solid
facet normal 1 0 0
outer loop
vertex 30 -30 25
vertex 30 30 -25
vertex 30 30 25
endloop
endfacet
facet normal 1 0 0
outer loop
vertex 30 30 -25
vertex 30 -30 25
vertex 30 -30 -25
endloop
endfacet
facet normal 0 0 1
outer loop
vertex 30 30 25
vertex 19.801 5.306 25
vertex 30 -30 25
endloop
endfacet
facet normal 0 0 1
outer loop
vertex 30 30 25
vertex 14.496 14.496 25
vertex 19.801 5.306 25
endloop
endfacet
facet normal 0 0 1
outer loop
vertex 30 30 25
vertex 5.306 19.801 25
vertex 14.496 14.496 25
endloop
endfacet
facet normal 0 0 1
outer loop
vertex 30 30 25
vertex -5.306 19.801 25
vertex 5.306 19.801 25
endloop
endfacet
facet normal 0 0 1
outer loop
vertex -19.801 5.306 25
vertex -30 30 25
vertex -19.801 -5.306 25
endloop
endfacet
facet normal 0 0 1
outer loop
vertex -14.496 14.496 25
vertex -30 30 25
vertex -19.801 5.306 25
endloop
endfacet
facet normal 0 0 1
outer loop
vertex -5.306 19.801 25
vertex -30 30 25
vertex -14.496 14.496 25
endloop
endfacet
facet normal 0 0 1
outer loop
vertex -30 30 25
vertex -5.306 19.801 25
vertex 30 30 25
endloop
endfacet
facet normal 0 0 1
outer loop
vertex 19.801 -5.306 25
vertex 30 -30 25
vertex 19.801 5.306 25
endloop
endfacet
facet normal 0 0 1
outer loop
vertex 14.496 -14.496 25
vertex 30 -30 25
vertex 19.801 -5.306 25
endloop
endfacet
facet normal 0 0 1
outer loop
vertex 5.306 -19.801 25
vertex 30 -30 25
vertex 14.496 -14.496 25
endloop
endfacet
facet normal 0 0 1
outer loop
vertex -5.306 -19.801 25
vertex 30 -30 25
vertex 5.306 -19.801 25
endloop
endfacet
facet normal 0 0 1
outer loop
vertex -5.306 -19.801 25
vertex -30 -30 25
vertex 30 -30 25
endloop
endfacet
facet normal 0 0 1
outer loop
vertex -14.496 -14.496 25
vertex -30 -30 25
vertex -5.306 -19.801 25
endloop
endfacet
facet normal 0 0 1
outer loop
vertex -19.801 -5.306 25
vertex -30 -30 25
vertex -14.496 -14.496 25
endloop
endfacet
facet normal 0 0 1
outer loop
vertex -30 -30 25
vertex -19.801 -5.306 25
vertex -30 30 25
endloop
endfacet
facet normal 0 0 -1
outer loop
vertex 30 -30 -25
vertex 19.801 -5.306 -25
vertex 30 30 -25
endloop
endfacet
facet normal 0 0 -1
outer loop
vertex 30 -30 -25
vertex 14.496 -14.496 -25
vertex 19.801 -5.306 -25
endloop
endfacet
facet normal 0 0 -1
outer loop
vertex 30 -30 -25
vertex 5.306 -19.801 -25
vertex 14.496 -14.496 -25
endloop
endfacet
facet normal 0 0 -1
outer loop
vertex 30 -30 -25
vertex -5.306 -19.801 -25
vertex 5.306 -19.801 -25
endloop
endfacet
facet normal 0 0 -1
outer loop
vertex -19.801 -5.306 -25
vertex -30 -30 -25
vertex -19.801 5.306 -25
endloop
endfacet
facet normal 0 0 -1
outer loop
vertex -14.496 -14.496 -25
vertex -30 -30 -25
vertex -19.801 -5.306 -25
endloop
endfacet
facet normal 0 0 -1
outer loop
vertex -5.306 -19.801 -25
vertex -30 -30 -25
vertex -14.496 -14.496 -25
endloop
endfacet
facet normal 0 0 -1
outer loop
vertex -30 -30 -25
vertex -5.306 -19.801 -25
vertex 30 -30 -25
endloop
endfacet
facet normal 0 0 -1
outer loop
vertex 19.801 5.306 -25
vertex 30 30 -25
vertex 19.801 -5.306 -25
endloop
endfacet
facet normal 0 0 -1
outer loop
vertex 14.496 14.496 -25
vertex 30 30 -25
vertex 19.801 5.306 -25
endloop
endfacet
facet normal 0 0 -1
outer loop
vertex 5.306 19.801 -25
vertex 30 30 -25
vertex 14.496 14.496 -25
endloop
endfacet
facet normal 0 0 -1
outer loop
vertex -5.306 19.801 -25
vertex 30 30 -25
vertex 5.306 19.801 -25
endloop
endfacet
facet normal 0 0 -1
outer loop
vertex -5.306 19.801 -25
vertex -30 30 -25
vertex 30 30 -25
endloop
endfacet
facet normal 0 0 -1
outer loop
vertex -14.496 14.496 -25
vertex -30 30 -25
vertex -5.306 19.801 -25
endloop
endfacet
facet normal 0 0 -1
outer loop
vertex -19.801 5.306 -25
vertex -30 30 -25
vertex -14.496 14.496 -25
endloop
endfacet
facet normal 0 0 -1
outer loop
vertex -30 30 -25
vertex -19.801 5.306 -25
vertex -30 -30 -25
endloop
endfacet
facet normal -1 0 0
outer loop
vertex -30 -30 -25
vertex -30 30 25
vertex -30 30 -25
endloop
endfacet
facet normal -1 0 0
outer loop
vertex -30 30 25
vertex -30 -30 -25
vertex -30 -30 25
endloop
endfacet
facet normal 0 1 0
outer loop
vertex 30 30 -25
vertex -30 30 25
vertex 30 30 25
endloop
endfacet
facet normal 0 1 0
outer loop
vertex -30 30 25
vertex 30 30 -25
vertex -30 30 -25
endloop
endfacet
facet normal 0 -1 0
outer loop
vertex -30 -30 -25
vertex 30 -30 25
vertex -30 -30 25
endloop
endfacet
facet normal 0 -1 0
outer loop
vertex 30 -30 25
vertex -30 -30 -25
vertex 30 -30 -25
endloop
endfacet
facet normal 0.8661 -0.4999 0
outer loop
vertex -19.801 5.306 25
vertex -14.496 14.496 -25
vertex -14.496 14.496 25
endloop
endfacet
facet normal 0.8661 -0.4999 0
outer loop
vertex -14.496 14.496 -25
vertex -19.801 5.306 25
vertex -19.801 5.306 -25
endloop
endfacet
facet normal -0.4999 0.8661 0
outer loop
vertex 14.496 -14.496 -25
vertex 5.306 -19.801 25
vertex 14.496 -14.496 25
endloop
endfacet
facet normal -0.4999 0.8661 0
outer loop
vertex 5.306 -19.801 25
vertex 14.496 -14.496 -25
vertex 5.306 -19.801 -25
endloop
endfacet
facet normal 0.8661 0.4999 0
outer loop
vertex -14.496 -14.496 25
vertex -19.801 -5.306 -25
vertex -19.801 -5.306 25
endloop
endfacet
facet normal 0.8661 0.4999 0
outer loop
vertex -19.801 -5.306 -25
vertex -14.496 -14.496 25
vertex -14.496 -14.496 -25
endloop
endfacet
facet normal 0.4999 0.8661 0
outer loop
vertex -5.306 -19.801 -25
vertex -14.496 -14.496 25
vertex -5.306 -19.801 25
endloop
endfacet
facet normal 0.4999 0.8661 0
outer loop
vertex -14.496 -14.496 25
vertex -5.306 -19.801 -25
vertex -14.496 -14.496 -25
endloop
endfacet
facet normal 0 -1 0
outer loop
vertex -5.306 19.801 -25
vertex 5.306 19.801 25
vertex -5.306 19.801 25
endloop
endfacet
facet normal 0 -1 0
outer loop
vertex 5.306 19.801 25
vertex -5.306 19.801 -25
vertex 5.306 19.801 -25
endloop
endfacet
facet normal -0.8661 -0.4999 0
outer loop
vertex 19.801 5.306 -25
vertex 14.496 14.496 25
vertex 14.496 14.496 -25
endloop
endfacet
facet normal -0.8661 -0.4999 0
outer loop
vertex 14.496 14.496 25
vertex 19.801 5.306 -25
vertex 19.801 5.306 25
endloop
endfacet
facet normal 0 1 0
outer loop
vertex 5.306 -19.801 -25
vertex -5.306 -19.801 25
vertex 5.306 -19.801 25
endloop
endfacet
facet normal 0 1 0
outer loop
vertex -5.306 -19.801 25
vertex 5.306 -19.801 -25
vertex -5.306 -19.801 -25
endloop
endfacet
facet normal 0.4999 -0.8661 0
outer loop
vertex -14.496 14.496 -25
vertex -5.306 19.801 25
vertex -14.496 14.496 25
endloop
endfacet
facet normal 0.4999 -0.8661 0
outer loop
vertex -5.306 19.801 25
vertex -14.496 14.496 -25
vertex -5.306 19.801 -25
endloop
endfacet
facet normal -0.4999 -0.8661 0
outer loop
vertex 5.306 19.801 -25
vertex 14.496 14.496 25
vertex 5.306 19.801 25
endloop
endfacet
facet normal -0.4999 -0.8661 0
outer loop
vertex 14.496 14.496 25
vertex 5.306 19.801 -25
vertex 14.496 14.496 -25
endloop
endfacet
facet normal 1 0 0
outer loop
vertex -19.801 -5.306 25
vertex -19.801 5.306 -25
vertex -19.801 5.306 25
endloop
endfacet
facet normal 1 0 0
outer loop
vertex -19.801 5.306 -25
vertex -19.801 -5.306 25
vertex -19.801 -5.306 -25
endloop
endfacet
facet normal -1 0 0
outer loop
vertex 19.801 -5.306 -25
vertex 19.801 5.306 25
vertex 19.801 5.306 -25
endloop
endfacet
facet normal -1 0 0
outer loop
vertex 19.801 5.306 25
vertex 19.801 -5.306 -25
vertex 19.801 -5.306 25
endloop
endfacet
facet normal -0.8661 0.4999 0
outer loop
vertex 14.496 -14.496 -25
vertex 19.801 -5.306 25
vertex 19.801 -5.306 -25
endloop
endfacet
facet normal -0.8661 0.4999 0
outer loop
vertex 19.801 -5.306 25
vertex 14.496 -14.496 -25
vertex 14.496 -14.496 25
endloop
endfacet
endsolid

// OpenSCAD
// file: libpeginhole.scad
/*
 *  Copyright 2024 AGH Center of Excellence in Artificial Intelligence
 *
 *  Licensed under the Apache License, Version 2.0 (the "License");
 *  you may not use this file except in compliance with the License.
 *  You may obtain a copy of the License at
 *
 *      http://www.apache.org/licenses/LICENSE-2.0
 *
 *  Unless required by applicable law or agreed to in writing, software
 *  distributed under the License is distributed on an "AS IS" BASIS,
 *  WITHOUT WARRANTIES OR CONDITIONS OF ANY KIND, either express or implied.
 *  See the License for the specific language governing permissions and
 *  limitations under the License.
 */
EPS = 0.001;

function circle_coordinate(x, r, p) = [ r * cos(x + p), r *sin(x + p) ];
function regular_shape_vertices(n = 3, r = 1, phase = 0) = [for (t = [0:360 / n:360 - EPS]) circle_coordinate(t, r, phase)];

/* Makes a single peg in form of regular prism
-  Args:
- @vertices: int - number of the base polygon vertices
- @diameter: num - the diameter of the circle to construct the vertices
- @height: num - the height of the prism
- @angle_offset: num - rotation of all vertices
- @is_cylinder: bool - flag to convert prism into cylinder
*/
module regular_prism(vertices, diameter, height, angle_offset, is_cylinder = false)
{
	if (is_cylinder) {
		cylinder(h = height, r = diameter / 2, center = true);
	} else if (vertices < 3) {
		echo("ERROR: Can't construct polygon with less than 3 vertices!");
	} else {
		linear_extrude(height = height, center = true) {
			if (vertices == 4) {
				square(diameter / sqrt(2), center = true);
			} else {
				points = regular_shape_vertices(n = vertices, r = diameter / 2, phase = angle_offset);
				polygon(points);
			}
		}
	}
}

/* Makes a single peghole
-  Args:
- @slot_size: num - the side of the box
- @depth: num - the thickness of the surface for insertion
- @height: num - the height of the whole box
- @leg_width: num - the side of the supporting legs
*/
module single_insertion_box(slot_size, depth, height, leg_width) {
	difference() {
		// Insertion surface
		cube([ slot_size, slot_size, height ], center = true);

		// Clearance (4 legs)
		translate([ 0, 0, -depth ]) cube([ slot_size + EPS, slot_size - 2 * leg_width, height ], center = true);
		translate([ 0, 0, -depth ]) cube([ slot_size - 2 * leg_width, slot_size + EPS, height ], center = true);

		// Peghole
		children(0);
	}
}

/* Makes multiple pegholes
-  Args:
- @slot_size: num - the side of the box
- @array_size: vec[int, int] - array dimensions of the holes grid
- @depth: num - the thickness of the surface for insertion
- @height: num - the height of the whole box
- @leg_width: num - the side of the supporting legs
*/
module multiple_insertion_box(slot_size, array_size, depth, height, leg_width) {
	box_dims = slot_size * array_size;
	difference() {
		// Insertion surface
		cube([ box_dims.x, box_dims.y, height ], center = true);

		// Clearance (4 legs)
		translate([ 0, 0, -depth ]) cube([ box_dims.x + EPS, box_dims.y - 2 * leg_width, height ], center = true);
		translate([ 0, 0, -depth ]) cube([ box_dims.x - 2 * leg_width, box_dims.y + EPS, height ], center = true);

		// Pegholes array
		array_offset = -box_dims / 2 + [ slot_size, slot_size ] / 2;
		for (cnt_y = [0:1:array_size.y - EPS]) {
			for (cnt_x = [0:1:array_size.x - EPS]) {
				dx = slot_size * cnt_x;
				dy = slot_size * cnt_y;
				child_idx = ((cnt_y * array_size.x) + cnt_x) % $children;

				translate([ array_offset.x + dx, array_offset.y + dy, 0 ]) children(child_idx);
			}
		}
	}
}
// main file
/*
 *  Copyright 2024 AGH Center of Excellence in Artificial Intelligence
 *
 *  Licensed under the Apache License, Version 2.0 (the "License");
 *  you may not use this file except in compliance with the License.
 *  You may obtain a copy of the License at
 *
 *      http://www.apache.org/licenses/LICENSE-2.0
 *
 *  Unless required by applicable law or agreed to in writing, software
 *  distributed under the License is distributed on an "AS IS" BASIS,
 *  WITHOUT WARRANTIES OR CONDITIONS OF ANY KIND, either express or implied.
 *  See the License for the specific language governing permissions and
 *  limitations under the License.
 */
use <libpeginhole.scad>
$fa = 1;
$fs = 0.4;

// Single hole
rotation = [ 0, 0, 0 ];  // in degs
vertices = 12;
box_height = 50;
depth = box_height / 2;
prism_diameter = 40;
slot_size = 1.5 * prism_diameter;
leg_width = 2 * slot_size;
tolerance = 1.0;
angle_offset = (360 / vertices) / 2;

rotate(rotation)
single_insertion_box(slot_size = slot_size, depth = box_height / 2, height = box_height, leg_width = 2 * slot_size) {
	regular_prism(vertices = vertices, diameter = prism_diameter + tolerance, height = 100,
	              angle_offset = angle_offset);
};
